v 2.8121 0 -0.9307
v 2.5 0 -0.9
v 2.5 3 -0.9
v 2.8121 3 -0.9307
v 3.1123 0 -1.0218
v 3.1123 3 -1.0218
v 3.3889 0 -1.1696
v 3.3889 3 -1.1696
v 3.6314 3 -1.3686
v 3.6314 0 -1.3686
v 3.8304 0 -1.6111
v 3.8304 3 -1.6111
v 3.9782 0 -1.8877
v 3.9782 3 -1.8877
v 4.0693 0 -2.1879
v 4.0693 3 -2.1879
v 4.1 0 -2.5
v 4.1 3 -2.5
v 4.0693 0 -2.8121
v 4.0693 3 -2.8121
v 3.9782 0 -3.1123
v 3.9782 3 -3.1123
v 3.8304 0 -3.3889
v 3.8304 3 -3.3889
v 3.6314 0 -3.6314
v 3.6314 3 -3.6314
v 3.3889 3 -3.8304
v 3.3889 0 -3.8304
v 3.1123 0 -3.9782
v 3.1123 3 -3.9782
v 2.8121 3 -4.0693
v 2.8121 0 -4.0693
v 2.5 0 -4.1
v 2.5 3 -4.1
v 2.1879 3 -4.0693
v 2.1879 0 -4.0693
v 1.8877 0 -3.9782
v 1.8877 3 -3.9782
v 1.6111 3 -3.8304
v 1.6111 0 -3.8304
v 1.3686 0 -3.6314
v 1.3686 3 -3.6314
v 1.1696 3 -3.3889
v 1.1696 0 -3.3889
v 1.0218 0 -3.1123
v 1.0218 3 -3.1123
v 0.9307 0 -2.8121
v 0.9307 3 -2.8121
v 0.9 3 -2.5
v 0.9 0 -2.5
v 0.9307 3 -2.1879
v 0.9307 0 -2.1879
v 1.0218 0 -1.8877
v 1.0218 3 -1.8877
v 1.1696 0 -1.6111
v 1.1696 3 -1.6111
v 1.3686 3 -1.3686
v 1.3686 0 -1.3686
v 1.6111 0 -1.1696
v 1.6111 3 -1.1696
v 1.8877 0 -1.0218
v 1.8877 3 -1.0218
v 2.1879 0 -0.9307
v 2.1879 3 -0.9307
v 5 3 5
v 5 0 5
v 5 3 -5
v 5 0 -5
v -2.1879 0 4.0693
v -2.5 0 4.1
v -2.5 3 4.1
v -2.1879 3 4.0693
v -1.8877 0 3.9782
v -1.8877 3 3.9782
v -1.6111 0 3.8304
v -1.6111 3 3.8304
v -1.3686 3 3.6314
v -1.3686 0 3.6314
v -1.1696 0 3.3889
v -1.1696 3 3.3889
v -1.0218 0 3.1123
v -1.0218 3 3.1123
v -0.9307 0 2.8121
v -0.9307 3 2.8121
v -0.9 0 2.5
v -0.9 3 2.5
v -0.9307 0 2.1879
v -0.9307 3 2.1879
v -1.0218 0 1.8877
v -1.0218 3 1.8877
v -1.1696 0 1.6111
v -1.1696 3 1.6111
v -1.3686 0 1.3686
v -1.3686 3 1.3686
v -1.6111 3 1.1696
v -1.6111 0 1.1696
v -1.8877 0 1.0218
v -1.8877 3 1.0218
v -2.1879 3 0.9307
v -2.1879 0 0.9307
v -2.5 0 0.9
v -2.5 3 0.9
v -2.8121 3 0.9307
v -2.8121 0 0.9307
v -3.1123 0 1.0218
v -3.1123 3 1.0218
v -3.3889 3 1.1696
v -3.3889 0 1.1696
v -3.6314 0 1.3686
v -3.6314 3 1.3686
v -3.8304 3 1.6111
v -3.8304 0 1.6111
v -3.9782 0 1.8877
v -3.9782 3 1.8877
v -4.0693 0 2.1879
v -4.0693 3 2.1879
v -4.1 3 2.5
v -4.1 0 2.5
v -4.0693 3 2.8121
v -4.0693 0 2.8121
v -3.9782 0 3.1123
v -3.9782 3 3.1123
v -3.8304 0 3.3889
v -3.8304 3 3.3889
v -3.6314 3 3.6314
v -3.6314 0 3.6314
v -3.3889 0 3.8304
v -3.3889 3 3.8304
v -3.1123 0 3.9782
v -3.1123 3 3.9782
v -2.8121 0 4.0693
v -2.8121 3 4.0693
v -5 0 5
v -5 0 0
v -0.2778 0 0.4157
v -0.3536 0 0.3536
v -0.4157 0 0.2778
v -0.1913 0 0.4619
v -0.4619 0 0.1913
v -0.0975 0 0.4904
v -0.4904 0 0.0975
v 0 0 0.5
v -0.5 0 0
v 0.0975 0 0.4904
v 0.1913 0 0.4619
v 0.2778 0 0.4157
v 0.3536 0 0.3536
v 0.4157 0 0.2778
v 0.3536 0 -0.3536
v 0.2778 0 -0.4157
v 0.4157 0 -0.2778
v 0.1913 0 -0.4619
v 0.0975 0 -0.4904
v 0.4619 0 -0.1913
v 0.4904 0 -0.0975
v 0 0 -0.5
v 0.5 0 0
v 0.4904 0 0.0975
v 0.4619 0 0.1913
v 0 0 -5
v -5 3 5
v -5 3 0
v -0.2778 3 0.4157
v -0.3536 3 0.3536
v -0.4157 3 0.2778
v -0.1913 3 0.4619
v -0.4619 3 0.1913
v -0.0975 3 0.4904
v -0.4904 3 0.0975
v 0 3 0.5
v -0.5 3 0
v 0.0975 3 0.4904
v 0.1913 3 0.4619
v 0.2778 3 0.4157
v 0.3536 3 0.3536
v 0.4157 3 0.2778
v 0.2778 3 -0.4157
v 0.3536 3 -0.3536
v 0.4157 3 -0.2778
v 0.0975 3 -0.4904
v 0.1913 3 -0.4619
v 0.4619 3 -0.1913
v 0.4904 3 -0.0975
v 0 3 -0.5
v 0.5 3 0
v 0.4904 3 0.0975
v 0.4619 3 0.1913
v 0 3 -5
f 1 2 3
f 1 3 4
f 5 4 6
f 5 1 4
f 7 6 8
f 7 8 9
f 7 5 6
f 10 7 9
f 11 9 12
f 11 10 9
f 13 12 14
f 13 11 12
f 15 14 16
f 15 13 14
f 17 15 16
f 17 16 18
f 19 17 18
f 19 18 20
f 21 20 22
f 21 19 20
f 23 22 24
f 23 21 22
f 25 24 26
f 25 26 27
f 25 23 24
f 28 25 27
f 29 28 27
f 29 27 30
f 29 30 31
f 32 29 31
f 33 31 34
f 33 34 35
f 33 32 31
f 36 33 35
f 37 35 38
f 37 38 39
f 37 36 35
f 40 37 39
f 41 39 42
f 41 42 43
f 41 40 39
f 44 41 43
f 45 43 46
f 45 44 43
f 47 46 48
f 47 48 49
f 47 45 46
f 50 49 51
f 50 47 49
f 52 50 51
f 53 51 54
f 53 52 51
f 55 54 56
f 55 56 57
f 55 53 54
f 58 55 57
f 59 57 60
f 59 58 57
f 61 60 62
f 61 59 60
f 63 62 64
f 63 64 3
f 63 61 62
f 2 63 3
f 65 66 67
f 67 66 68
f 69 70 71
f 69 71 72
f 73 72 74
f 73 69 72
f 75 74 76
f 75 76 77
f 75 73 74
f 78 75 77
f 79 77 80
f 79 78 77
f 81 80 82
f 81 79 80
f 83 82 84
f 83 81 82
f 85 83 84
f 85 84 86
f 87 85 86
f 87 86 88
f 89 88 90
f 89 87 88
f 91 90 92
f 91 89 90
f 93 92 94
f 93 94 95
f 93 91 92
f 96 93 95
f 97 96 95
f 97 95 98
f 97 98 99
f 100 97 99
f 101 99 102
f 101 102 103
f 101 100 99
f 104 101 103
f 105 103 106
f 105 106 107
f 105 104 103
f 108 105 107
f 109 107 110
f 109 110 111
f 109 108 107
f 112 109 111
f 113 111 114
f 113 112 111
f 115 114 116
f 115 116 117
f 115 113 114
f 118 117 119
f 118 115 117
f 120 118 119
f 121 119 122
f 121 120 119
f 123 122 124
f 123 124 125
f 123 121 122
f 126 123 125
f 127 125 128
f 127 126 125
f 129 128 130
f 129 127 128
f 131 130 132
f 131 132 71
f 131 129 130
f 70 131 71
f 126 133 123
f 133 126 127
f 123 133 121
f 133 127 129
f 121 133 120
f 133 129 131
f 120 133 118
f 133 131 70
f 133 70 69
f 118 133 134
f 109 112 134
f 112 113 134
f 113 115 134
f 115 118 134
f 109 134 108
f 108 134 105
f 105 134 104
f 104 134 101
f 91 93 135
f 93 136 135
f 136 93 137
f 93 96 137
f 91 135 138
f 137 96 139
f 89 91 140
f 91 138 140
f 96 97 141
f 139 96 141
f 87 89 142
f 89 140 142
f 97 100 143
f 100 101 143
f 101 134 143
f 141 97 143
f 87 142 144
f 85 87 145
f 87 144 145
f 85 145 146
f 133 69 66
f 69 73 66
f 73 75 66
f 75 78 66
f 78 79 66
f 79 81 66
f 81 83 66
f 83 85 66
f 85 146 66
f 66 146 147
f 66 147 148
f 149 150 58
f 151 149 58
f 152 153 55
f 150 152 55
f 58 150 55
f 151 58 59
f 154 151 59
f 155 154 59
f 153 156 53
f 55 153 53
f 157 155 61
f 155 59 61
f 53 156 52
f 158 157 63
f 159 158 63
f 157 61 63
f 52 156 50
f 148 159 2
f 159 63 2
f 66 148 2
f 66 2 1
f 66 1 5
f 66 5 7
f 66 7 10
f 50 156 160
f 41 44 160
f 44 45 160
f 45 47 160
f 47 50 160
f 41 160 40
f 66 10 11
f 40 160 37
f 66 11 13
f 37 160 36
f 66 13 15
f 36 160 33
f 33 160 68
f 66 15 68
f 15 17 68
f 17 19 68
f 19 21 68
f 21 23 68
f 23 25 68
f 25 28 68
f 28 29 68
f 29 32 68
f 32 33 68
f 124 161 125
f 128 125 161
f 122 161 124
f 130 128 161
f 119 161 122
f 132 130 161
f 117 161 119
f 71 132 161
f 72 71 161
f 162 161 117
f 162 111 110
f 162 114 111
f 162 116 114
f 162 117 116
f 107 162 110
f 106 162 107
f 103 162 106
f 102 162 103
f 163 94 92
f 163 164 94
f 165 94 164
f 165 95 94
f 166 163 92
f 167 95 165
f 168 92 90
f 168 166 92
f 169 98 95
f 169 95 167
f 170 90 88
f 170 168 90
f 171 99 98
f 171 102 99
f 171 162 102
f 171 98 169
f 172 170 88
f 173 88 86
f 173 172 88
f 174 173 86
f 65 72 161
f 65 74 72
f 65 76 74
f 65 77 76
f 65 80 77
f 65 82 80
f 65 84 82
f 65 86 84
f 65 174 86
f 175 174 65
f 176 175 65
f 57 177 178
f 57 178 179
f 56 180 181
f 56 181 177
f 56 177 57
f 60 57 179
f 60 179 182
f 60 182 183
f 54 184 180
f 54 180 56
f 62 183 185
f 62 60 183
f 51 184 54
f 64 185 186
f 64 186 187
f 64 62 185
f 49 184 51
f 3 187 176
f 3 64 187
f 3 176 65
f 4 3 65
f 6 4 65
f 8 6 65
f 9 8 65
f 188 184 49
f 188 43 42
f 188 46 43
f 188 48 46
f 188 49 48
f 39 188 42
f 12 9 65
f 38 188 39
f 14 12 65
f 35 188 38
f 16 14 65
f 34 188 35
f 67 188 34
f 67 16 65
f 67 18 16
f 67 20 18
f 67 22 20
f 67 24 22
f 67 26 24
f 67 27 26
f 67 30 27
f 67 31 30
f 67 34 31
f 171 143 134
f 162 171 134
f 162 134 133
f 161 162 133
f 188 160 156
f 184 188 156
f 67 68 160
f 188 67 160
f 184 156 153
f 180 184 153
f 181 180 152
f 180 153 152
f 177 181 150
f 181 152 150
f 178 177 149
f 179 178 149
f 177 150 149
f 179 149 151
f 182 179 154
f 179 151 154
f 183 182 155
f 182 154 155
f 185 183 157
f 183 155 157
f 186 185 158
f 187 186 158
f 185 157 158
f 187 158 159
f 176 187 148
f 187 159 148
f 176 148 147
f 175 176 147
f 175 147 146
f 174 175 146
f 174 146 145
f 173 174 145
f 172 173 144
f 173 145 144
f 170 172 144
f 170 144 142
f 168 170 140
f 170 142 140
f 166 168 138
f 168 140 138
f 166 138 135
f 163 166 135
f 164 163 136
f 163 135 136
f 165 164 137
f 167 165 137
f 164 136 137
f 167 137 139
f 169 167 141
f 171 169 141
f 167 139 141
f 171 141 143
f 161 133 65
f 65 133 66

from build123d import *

# Parameters (mm, degrees)
CROQUIS1_R              = 1.6
SALIENTE_EXTRUIR1_DEPTH = 3


with BuildPart() as part:
    # Croquis1 → Saliente-Extruir1 (new body)
    with BuildSketch(Plane(origin=(0, 0, 0), x_dir=(1, 0, 0), z_dir=(0, 1, 0))):
        with BuildLine():
            Line((-0.5, 0), (-5, 0))
            Line((-5, 0), (-5, -5))
            Line((-5, -5), (5, -5))
            Line((5, -5), (5, 5))
            Line((5, 5), (0, 5))
            Line((0, 5), (0, 0.5))
            ThreePointArc((0, 0.5), (0.353553391, -0.353553391), (-0.5, 0))
        make_face()
        with Locations(Location((-2.5, -2.5, 0), (0, 0, 270))):
            Circle(CROQUIS1_R, mode=Mode.SUBTRACT)
        with Locations(Location((2.5, 2.5, 0), (0, 0, 270))):
            Circle(CROQUIS1_R, mode=Mode.SUBTRACT)
    extrude(amount=SALIENTE_EXTRUIR1_DEPTH)


solid = part.part
